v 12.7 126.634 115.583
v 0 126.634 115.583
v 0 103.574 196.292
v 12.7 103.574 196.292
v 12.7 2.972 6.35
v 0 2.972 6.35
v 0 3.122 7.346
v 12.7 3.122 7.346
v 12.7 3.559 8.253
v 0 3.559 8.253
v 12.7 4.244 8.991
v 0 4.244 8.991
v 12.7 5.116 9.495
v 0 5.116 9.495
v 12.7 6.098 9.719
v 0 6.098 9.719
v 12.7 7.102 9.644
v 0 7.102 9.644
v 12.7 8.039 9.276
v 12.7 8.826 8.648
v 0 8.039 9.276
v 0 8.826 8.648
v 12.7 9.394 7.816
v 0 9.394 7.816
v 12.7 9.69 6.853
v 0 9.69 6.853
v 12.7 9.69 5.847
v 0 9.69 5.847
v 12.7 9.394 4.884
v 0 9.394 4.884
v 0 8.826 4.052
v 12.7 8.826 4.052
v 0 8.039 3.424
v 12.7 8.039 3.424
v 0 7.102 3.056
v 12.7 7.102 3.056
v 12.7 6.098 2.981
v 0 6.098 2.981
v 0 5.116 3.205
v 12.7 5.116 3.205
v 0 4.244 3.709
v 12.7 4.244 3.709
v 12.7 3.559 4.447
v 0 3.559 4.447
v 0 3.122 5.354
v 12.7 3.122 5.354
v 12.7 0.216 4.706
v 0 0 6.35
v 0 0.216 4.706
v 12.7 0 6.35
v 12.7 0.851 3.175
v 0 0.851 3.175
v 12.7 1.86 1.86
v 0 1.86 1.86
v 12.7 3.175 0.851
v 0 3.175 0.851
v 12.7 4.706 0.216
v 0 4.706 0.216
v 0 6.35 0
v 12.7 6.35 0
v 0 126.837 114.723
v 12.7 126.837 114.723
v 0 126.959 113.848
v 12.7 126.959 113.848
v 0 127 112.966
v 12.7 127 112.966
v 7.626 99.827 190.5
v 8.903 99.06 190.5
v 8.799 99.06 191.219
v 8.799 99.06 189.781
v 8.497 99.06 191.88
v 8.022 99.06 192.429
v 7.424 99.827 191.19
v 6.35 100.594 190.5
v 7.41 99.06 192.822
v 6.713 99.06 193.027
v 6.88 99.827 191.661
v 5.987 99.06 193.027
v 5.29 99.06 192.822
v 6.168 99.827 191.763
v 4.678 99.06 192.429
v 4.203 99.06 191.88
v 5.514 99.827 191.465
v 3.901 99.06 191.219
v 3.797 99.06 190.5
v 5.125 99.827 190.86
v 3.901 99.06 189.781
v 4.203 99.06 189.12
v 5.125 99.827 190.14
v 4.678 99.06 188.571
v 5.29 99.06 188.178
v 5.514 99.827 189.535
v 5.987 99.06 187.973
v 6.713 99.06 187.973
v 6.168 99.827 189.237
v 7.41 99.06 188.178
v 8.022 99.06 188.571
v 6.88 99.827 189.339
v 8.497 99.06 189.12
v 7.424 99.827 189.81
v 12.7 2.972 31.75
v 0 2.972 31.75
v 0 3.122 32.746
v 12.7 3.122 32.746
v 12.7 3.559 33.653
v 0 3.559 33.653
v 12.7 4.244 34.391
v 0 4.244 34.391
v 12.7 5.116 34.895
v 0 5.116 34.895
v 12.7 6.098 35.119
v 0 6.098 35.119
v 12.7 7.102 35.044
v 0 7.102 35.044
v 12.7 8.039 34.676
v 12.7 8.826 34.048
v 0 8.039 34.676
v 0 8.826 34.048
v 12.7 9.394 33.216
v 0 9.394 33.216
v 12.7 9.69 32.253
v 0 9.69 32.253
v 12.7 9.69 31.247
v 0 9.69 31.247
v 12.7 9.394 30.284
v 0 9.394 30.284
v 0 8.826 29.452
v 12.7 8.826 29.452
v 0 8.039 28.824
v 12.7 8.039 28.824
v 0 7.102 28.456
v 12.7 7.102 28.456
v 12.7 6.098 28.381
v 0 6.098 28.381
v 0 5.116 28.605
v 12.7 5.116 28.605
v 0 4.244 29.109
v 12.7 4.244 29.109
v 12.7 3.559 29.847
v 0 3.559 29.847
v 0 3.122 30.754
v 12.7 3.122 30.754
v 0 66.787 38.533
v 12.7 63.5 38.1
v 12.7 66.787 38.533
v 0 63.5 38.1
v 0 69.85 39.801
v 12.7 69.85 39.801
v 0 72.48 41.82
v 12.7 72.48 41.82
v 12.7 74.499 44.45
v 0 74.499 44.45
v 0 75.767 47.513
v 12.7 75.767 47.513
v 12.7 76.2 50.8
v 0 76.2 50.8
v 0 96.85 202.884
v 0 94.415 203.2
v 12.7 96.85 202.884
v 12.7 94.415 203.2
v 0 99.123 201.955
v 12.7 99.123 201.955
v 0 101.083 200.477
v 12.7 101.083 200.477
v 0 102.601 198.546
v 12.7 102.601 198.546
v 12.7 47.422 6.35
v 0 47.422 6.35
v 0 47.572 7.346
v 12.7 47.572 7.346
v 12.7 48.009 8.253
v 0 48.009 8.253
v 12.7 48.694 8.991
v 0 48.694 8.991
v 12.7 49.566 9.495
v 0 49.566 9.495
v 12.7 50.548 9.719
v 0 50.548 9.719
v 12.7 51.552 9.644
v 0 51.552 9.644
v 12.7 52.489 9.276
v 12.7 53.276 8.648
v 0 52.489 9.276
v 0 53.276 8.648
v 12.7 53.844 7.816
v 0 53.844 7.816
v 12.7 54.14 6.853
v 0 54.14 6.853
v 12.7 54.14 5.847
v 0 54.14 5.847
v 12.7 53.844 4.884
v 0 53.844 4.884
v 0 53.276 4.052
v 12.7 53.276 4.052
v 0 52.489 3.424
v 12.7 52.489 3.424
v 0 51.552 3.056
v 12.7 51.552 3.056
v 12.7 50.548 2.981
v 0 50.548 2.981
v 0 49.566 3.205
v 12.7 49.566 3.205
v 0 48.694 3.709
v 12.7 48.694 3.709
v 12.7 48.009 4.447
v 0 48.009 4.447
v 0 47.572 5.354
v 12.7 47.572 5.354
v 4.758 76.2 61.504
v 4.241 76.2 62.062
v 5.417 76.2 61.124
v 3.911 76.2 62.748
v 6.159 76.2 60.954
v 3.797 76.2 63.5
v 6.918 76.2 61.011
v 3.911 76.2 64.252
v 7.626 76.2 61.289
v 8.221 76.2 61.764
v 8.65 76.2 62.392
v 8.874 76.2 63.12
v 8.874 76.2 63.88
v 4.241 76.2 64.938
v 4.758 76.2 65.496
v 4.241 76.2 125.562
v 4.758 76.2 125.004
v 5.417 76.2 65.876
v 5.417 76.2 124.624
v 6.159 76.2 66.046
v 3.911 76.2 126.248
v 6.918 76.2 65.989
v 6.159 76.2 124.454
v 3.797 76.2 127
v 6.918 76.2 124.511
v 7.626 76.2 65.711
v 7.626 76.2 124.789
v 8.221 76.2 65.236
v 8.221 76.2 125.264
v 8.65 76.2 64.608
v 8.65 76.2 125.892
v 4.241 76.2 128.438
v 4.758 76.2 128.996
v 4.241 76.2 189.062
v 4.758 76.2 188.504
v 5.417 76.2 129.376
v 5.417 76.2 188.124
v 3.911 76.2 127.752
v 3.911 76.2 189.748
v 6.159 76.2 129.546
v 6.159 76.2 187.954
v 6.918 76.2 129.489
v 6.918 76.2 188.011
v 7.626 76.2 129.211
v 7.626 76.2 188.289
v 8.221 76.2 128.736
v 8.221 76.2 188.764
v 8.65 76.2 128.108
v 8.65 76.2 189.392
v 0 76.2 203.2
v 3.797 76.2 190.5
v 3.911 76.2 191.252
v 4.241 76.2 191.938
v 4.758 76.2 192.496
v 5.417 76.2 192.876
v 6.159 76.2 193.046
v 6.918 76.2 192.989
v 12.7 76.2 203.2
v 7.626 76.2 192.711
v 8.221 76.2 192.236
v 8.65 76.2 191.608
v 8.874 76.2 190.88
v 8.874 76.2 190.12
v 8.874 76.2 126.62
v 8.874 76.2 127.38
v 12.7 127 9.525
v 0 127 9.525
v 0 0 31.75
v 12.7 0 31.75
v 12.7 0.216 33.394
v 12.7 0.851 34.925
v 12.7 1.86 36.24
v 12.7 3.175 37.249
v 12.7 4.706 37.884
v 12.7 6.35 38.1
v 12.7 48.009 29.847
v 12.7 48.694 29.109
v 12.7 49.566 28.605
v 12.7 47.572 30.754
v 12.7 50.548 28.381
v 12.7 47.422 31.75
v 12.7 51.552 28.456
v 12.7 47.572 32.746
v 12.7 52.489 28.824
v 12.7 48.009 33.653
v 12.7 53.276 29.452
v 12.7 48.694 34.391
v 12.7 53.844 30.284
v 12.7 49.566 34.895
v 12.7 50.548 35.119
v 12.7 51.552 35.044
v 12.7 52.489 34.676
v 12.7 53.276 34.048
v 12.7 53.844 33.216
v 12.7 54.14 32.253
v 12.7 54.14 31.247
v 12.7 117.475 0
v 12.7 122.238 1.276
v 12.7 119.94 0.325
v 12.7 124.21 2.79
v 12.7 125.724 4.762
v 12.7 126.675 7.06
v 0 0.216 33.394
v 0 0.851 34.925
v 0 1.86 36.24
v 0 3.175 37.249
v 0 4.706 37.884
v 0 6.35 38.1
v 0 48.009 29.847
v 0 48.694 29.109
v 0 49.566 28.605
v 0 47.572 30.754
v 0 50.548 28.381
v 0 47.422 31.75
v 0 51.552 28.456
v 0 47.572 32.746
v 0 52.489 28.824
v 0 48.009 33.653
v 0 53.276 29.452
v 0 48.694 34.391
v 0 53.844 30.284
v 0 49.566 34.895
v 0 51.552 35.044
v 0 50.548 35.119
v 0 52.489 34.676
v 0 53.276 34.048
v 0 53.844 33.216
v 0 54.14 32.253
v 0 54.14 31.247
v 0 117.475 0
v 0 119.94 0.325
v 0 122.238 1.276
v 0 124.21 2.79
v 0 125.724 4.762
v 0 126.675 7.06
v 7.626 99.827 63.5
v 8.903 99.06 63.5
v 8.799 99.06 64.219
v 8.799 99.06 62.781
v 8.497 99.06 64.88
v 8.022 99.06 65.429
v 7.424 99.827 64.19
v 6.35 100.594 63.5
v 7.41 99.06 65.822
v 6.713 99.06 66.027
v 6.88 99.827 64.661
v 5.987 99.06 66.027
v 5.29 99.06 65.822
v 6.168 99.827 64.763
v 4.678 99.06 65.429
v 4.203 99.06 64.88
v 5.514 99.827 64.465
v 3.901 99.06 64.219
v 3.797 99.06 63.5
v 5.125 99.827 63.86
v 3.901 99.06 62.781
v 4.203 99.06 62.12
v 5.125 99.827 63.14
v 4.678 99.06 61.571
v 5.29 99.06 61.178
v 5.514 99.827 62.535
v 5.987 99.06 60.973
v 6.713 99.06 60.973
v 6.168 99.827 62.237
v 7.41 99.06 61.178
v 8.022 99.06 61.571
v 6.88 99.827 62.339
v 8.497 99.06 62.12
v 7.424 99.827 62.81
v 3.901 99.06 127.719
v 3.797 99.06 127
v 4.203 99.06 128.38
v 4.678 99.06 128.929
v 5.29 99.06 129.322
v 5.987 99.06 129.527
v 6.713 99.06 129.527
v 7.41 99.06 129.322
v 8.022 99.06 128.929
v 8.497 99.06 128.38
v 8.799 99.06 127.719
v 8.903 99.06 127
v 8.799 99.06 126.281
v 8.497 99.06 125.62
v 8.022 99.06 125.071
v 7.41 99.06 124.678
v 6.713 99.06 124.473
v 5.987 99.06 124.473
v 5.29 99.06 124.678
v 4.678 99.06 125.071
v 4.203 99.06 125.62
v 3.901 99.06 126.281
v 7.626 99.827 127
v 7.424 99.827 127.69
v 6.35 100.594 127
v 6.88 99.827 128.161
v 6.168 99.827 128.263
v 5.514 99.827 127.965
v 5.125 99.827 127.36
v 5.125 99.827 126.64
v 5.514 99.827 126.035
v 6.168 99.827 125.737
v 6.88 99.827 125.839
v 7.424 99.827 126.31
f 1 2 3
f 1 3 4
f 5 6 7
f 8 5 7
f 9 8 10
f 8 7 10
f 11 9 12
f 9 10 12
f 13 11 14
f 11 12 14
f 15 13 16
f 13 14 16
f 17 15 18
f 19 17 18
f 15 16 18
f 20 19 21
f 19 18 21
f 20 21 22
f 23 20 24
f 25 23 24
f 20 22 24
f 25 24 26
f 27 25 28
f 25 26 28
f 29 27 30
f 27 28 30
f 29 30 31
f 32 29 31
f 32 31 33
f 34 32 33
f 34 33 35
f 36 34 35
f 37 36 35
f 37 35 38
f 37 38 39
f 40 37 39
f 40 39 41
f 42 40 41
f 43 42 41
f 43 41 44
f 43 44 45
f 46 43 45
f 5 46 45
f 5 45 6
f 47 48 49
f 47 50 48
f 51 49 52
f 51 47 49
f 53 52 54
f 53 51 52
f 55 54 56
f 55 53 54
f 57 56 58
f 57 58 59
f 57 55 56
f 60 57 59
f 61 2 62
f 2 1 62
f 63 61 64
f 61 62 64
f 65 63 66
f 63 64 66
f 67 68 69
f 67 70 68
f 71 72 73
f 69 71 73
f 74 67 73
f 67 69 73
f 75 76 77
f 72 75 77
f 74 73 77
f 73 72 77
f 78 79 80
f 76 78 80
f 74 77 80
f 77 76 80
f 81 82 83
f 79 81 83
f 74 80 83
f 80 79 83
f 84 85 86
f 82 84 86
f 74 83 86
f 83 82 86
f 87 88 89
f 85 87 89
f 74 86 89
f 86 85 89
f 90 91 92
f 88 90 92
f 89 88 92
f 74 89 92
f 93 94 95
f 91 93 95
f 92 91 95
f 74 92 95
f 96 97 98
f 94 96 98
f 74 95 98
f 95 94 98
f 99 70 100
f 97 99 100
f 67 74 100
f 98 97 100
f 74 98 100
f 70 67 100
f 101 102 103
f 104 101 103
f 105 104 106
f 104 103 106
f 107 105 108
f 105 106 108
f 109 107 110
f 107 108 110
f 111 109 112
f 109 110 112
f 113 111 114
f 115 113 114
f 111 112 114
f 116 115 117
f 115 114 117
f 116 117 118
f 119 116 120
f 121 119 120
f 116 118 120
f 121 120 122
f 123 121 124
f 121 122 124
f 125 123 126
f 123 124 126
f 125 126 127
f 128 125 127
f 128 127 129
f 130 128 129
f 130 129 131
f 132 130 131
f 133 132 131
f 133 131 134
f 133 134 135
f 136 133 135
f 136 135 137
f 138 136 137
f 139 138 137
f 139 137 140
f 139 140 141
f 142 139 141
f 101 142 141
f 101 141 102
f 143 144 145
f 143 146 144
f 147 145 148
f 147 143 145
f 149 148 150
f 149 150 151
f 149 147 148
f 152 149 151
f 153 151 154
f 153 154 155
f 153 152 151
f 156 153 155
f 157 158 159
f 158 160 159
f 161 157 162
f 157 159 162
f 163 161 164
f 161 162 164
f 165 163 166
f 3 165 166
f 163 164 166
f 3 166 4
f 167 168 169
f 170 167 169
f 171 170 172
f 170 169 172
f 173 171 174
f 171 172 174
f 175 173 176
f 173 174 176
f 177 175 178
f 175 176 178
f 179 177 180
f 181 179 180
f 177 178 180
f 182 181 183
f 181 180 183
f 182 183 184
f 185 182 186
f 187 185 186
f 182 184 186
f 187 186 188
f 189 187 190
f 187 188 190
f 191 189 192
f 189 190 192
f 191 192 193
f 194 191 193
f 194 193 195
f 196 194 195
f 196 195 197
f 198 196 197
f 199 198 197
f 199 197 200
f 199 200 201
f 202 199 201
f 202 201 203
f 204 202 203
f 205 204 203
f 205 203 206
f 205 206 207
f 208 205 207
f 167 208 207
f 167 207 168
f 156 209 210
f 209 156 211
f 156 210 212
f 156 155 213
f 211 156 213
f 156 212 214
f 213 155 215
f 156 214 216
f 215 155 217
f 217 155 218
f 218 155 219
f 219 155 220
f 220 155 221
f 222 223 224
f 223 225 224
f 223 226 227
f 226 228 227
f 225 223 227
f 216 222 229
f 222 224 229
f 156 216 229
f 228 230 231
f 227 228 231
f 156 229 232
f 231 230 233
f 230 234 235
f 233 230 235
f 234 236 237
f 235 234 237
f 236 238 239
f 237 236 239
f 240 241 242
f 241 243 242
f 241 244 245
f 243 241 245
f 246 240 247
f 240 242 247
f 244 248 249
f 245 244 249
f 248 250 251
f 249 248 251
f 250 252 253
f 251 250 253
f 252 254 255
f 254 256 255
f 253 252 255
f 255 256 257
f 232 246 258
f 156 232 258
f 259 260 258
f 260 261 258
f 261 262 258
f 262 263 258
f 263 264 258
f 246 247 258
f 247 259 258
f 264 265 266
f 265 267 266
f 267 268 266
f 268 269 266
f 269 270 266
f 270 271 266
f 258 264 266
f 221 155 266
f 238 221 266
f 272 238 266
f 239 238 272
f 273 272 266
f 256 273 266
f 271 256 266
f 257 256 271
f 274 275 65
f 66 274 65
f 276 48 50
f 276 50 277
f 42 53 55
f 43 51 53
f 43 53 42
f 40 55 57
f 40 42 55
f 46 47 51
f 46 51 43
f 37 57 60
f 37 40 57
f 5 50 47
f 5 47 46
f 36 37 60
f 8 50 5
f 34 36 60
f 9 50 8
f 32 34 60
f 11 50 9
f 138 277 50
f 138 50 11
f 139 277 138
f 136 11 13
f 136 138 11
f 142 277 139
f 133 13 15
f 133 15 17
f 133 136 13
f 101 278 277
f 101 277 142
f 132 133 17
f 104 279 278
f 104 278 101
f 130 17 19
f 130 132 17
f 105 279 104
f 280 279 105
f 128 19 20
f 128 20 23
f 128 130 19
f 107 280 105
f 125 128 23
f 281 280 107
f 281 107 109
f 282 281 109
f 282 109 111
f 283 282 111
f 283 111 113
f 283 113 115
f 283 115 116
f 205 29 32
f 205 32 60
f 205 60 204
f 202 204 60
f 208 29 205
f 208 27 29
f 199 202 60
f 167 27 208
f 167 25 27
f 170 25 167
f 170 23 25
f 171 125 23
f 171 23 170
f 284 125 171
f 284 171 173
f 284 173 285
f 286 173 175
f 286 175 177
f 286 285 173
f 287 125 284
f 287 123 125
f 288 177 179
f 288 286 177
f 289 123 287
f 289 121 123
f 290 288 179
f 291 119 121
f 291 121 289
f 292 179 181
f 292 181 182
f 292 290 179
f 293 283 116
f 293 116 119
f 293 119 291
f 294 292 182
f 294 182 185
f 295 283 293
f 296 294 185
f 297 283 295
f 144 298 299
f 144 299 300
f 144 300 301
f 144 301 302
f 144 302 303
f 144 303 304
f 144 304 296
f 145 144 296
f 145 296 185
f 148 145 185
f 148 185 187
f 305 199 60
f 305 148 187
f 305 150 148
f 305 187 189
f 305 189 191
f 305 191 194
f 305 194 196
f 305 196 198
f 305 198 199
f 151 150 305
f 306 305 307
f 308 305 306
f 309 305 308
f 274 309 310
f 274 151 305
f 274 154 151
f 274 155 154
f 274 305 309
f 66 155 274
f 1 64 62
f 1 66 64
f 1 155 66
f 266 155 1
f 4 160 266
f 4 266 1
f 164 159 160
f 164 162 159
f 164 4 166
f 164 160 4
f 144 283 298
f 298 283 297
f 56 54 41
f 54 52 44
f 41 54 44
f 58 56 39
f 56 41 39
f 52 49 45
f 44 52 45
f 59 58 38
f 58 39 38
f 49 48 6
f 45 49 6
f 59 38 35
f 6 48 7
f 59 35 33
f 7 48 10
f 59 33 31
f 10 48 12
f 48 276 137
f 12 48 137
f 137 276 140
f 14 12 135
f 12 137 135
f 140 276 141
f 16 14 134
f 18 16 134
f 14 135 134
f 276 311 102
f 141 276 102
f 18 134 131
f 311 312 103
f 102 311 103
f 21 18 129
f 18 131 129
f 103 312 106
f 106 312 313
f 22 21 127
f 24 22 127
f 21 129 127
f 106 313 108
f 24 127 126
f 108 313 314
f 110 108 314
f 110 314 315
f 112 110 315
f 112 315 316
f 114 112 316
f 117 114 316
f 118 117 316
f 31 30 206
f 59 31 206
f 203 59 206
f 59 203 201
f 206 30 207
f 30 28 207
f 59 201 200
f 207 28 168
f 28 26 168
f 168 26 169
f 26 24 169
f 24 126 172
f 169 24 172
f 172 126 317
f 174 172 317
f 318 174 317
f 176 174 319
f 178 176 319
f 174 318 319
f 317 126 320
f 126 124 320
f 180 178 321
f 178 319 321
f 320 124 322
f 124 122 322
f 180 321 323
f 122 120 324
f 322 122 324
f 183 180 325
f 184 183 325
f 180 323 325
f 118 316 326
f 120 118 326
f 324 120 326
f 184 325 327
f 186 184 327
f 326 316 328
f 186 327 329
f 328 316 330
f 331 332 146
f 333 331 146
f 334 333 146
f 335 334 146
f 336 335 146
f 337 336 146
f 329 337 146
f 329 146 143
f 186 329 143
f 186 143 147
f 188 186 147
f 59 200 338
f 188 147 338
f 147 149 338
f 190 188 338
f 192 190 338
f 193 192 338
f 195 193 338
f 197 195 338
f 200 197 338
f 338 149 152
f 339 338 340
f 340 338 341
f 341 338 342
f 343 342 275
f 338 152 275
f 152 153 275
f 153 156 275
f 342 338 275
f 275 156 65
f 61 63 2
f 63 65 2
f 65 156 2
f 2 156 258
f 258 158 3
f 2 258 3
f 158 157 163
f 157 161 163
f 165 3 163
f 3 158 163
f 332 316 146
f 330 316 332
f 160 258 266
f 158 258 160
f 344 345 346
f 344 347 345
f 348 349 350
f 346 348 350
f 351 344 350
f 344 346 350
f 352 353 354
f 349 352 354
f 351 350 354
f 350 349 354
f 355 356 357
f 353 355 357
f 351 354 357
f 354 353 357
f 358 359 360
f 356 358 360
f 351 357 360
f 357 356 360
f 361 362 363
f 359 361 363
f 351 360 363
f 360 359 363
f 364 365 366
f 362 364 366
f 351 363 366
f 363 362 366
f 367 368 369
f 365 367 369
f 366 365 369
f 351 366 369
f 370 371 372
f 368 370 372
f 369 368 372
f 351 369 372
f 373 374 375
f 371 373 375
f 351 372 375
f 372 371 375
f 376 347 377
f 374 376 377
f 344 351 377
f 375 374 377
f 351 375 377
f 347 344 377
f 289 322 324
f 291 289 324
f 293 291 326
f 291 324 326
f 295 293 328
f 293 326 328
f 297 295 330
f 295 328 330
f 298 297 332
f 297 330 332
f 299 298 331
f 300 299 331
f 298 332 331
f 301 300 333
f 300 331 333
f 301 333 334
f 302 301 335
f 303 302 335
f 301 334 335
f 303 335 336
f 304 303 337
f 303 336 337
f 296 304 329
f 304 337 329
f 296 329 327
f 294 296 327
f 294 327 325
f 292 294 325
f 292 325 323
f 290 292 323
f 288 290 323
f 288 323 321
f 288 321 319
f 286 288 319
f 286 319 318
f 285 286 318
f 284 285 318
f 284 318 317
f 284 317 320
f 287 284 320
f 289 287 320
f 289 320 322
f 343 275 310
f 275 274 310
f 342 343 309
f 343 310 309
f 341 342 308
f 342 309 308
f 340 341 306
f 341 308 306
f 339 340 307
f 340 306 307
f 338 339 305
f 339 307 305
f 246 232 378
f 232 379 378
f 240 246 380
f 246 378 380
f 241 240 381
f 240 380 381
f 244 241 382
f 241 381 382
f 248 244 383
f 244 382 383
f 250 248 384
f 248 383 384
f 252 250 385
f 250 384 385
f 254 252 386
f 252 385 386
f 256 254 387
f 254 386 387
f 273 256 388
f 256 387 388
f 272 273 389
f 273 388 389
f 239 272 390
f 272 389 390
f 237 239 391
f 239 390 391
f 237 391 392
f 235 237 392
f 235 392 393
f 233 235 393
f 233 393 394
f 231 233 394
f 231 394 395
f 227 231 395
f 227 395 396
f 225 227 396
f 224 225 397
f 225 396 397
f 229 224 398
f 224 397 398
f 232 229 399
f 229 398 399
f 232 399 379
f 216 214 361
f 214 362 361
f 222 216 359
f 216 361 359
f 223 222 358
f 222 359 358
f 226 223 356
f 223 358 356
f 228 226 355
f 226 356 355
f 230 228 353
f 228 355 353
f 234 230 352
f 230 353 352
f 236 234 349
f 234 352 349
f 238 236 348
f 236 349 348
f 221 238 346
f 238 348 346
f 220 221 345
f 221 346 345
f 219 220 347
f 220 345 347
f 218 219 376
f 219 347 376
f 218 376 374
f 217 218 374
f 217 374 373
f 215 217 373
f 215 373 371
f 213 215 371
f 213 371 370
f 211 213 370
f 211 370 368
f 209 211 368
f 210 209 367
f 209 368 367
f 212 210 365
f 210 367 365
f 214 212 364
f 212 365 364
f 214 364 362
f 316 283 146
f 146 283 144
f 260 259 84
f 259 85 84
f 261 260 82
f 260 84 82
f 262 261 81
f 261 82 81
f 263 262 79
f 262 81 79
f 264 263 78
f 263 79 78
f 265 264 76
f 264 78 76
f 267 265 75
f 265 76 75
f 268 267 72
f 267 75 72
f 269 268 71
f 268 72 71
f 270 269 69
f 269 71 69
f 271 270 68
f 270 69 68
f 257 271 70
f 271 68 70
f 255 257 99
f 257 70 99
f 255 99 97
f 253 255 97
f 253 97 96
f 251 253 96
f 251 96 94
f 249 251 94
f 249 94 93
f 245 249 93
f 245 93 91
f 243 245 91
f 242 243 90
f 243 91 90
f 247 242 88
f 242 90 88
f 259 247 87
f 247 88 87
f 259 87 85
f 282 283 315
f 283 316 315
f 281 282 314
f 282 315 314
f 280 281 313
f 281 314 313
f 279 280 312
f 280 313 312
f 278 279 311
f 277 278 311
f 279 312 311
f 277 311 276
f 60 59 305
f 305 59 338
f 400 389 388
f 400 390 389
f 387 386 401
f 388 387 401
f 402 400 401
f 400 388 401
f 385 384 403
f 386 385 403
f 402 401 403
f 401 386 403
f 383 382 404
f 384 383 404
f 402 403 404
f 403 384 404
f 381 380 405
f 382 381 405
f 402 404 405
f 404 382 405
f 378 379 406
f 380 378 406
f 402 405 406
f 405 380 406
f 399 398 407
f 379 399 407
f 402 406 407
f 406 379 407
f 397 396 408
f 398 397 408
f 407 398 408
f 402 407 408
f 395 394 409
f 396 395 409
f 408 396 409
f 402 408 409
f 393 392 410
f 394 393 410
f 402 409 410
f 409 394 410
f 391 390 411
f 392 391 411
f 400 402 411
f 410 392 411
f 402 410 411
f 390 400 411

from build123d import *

# Parameters (mm, degrees)
F0_W     = 127
F0_H     = 203.2
F1_DEPTH = 12.7
F3_D     = 6.7564
F4_W     = 76.2
F4_H     = 165.1
F5_DEPTH = 12.7
F7_R     = 12.7
F8_D     = 5.1054
F8_DEPTH = 22.859997
F8_TIP   = 1.5338169022
F9_SIZE2 = 88.9
F9_SIZE  = 25.4
F10_R    = 9.525
F11_R    = 6.35


with BuildPart() as f1:
    # F0 (on Right) → F1 (new body)
    with BuildSketch(Plane.YZ):
        with Locations((63.5, 101.6)):
            Rectangle(F0_W, F0_H)
    extrude(amount=F1_DEPTH)

    # F3 (through all)
    with Locations(Plane.YZ.offset(12.7)):
        with Locations((6.35, 31.75), (50.8, 31.75), (50.8, 6.35), (6.35, 6.35)):
            Hole(F3_D / 2)

    # F4 (on face) → F5 (cut, through all)
    with BuildSketch(Plane.YZ.offset(12.7)):
        with Locations((38.1, 120.65)):
            Rectangle(F4_W, F4_H)
    extrude(amount=-F5_DEPTH, mode=Mode.SUBTRACT)

    # F7
    f7_edges = [f1.edges().sort_by_distance(p)[0] for p in [
        (6.35, 76.2, 38.1),
    ]]
    fillet(f7_edges, radius=F7_R)

    # F8
    with Locations(Plane.XZ.offset(-76.2)):
        with Locations((6.35, 190.5), (6.35, 127), (6.35, 63.5)):
            Hole(F8_D / 2, depth=F8_DEPTH)
            with Locations((0, 0, -(F8_DEPTH + F8_TIP / 2))):  # 118° drill point
                Cone(0, F8_D / 2, F8_TIP, mode=Mode.SUBTRACT)

    # F9
    f9_edges = [f1.edges().sort_by_distance(p)[0] for p in [
        (6.35, 127, 203.2),
    ]]
    f9_side = f1.faces().sort_by_distance((6.35, 101.6, 203.2))[0]
    chamfer(f9_edges, length=F9_SIZE, length2=F9_SIZE2, reference=f9_side)

    # F10
    f10_edges = [f1.edges().sort_by_distance(p)[0] for p in [
        (6.35, 127, 0),
        (6.35, 101.6, 203.2),
        (6.35, 127, 114.3),
    ]]
    fillet(f10_edges, radius=F10_R)

    # F11
    f11_edges = [f1.edges().sort_by_distance(p)[0] for p in [
        (6.35, 0, 38.1),
        (6.35, 0, 0),
    ]]
    fillet(f11_edges, radius=F11_R)


solid = f1.part
